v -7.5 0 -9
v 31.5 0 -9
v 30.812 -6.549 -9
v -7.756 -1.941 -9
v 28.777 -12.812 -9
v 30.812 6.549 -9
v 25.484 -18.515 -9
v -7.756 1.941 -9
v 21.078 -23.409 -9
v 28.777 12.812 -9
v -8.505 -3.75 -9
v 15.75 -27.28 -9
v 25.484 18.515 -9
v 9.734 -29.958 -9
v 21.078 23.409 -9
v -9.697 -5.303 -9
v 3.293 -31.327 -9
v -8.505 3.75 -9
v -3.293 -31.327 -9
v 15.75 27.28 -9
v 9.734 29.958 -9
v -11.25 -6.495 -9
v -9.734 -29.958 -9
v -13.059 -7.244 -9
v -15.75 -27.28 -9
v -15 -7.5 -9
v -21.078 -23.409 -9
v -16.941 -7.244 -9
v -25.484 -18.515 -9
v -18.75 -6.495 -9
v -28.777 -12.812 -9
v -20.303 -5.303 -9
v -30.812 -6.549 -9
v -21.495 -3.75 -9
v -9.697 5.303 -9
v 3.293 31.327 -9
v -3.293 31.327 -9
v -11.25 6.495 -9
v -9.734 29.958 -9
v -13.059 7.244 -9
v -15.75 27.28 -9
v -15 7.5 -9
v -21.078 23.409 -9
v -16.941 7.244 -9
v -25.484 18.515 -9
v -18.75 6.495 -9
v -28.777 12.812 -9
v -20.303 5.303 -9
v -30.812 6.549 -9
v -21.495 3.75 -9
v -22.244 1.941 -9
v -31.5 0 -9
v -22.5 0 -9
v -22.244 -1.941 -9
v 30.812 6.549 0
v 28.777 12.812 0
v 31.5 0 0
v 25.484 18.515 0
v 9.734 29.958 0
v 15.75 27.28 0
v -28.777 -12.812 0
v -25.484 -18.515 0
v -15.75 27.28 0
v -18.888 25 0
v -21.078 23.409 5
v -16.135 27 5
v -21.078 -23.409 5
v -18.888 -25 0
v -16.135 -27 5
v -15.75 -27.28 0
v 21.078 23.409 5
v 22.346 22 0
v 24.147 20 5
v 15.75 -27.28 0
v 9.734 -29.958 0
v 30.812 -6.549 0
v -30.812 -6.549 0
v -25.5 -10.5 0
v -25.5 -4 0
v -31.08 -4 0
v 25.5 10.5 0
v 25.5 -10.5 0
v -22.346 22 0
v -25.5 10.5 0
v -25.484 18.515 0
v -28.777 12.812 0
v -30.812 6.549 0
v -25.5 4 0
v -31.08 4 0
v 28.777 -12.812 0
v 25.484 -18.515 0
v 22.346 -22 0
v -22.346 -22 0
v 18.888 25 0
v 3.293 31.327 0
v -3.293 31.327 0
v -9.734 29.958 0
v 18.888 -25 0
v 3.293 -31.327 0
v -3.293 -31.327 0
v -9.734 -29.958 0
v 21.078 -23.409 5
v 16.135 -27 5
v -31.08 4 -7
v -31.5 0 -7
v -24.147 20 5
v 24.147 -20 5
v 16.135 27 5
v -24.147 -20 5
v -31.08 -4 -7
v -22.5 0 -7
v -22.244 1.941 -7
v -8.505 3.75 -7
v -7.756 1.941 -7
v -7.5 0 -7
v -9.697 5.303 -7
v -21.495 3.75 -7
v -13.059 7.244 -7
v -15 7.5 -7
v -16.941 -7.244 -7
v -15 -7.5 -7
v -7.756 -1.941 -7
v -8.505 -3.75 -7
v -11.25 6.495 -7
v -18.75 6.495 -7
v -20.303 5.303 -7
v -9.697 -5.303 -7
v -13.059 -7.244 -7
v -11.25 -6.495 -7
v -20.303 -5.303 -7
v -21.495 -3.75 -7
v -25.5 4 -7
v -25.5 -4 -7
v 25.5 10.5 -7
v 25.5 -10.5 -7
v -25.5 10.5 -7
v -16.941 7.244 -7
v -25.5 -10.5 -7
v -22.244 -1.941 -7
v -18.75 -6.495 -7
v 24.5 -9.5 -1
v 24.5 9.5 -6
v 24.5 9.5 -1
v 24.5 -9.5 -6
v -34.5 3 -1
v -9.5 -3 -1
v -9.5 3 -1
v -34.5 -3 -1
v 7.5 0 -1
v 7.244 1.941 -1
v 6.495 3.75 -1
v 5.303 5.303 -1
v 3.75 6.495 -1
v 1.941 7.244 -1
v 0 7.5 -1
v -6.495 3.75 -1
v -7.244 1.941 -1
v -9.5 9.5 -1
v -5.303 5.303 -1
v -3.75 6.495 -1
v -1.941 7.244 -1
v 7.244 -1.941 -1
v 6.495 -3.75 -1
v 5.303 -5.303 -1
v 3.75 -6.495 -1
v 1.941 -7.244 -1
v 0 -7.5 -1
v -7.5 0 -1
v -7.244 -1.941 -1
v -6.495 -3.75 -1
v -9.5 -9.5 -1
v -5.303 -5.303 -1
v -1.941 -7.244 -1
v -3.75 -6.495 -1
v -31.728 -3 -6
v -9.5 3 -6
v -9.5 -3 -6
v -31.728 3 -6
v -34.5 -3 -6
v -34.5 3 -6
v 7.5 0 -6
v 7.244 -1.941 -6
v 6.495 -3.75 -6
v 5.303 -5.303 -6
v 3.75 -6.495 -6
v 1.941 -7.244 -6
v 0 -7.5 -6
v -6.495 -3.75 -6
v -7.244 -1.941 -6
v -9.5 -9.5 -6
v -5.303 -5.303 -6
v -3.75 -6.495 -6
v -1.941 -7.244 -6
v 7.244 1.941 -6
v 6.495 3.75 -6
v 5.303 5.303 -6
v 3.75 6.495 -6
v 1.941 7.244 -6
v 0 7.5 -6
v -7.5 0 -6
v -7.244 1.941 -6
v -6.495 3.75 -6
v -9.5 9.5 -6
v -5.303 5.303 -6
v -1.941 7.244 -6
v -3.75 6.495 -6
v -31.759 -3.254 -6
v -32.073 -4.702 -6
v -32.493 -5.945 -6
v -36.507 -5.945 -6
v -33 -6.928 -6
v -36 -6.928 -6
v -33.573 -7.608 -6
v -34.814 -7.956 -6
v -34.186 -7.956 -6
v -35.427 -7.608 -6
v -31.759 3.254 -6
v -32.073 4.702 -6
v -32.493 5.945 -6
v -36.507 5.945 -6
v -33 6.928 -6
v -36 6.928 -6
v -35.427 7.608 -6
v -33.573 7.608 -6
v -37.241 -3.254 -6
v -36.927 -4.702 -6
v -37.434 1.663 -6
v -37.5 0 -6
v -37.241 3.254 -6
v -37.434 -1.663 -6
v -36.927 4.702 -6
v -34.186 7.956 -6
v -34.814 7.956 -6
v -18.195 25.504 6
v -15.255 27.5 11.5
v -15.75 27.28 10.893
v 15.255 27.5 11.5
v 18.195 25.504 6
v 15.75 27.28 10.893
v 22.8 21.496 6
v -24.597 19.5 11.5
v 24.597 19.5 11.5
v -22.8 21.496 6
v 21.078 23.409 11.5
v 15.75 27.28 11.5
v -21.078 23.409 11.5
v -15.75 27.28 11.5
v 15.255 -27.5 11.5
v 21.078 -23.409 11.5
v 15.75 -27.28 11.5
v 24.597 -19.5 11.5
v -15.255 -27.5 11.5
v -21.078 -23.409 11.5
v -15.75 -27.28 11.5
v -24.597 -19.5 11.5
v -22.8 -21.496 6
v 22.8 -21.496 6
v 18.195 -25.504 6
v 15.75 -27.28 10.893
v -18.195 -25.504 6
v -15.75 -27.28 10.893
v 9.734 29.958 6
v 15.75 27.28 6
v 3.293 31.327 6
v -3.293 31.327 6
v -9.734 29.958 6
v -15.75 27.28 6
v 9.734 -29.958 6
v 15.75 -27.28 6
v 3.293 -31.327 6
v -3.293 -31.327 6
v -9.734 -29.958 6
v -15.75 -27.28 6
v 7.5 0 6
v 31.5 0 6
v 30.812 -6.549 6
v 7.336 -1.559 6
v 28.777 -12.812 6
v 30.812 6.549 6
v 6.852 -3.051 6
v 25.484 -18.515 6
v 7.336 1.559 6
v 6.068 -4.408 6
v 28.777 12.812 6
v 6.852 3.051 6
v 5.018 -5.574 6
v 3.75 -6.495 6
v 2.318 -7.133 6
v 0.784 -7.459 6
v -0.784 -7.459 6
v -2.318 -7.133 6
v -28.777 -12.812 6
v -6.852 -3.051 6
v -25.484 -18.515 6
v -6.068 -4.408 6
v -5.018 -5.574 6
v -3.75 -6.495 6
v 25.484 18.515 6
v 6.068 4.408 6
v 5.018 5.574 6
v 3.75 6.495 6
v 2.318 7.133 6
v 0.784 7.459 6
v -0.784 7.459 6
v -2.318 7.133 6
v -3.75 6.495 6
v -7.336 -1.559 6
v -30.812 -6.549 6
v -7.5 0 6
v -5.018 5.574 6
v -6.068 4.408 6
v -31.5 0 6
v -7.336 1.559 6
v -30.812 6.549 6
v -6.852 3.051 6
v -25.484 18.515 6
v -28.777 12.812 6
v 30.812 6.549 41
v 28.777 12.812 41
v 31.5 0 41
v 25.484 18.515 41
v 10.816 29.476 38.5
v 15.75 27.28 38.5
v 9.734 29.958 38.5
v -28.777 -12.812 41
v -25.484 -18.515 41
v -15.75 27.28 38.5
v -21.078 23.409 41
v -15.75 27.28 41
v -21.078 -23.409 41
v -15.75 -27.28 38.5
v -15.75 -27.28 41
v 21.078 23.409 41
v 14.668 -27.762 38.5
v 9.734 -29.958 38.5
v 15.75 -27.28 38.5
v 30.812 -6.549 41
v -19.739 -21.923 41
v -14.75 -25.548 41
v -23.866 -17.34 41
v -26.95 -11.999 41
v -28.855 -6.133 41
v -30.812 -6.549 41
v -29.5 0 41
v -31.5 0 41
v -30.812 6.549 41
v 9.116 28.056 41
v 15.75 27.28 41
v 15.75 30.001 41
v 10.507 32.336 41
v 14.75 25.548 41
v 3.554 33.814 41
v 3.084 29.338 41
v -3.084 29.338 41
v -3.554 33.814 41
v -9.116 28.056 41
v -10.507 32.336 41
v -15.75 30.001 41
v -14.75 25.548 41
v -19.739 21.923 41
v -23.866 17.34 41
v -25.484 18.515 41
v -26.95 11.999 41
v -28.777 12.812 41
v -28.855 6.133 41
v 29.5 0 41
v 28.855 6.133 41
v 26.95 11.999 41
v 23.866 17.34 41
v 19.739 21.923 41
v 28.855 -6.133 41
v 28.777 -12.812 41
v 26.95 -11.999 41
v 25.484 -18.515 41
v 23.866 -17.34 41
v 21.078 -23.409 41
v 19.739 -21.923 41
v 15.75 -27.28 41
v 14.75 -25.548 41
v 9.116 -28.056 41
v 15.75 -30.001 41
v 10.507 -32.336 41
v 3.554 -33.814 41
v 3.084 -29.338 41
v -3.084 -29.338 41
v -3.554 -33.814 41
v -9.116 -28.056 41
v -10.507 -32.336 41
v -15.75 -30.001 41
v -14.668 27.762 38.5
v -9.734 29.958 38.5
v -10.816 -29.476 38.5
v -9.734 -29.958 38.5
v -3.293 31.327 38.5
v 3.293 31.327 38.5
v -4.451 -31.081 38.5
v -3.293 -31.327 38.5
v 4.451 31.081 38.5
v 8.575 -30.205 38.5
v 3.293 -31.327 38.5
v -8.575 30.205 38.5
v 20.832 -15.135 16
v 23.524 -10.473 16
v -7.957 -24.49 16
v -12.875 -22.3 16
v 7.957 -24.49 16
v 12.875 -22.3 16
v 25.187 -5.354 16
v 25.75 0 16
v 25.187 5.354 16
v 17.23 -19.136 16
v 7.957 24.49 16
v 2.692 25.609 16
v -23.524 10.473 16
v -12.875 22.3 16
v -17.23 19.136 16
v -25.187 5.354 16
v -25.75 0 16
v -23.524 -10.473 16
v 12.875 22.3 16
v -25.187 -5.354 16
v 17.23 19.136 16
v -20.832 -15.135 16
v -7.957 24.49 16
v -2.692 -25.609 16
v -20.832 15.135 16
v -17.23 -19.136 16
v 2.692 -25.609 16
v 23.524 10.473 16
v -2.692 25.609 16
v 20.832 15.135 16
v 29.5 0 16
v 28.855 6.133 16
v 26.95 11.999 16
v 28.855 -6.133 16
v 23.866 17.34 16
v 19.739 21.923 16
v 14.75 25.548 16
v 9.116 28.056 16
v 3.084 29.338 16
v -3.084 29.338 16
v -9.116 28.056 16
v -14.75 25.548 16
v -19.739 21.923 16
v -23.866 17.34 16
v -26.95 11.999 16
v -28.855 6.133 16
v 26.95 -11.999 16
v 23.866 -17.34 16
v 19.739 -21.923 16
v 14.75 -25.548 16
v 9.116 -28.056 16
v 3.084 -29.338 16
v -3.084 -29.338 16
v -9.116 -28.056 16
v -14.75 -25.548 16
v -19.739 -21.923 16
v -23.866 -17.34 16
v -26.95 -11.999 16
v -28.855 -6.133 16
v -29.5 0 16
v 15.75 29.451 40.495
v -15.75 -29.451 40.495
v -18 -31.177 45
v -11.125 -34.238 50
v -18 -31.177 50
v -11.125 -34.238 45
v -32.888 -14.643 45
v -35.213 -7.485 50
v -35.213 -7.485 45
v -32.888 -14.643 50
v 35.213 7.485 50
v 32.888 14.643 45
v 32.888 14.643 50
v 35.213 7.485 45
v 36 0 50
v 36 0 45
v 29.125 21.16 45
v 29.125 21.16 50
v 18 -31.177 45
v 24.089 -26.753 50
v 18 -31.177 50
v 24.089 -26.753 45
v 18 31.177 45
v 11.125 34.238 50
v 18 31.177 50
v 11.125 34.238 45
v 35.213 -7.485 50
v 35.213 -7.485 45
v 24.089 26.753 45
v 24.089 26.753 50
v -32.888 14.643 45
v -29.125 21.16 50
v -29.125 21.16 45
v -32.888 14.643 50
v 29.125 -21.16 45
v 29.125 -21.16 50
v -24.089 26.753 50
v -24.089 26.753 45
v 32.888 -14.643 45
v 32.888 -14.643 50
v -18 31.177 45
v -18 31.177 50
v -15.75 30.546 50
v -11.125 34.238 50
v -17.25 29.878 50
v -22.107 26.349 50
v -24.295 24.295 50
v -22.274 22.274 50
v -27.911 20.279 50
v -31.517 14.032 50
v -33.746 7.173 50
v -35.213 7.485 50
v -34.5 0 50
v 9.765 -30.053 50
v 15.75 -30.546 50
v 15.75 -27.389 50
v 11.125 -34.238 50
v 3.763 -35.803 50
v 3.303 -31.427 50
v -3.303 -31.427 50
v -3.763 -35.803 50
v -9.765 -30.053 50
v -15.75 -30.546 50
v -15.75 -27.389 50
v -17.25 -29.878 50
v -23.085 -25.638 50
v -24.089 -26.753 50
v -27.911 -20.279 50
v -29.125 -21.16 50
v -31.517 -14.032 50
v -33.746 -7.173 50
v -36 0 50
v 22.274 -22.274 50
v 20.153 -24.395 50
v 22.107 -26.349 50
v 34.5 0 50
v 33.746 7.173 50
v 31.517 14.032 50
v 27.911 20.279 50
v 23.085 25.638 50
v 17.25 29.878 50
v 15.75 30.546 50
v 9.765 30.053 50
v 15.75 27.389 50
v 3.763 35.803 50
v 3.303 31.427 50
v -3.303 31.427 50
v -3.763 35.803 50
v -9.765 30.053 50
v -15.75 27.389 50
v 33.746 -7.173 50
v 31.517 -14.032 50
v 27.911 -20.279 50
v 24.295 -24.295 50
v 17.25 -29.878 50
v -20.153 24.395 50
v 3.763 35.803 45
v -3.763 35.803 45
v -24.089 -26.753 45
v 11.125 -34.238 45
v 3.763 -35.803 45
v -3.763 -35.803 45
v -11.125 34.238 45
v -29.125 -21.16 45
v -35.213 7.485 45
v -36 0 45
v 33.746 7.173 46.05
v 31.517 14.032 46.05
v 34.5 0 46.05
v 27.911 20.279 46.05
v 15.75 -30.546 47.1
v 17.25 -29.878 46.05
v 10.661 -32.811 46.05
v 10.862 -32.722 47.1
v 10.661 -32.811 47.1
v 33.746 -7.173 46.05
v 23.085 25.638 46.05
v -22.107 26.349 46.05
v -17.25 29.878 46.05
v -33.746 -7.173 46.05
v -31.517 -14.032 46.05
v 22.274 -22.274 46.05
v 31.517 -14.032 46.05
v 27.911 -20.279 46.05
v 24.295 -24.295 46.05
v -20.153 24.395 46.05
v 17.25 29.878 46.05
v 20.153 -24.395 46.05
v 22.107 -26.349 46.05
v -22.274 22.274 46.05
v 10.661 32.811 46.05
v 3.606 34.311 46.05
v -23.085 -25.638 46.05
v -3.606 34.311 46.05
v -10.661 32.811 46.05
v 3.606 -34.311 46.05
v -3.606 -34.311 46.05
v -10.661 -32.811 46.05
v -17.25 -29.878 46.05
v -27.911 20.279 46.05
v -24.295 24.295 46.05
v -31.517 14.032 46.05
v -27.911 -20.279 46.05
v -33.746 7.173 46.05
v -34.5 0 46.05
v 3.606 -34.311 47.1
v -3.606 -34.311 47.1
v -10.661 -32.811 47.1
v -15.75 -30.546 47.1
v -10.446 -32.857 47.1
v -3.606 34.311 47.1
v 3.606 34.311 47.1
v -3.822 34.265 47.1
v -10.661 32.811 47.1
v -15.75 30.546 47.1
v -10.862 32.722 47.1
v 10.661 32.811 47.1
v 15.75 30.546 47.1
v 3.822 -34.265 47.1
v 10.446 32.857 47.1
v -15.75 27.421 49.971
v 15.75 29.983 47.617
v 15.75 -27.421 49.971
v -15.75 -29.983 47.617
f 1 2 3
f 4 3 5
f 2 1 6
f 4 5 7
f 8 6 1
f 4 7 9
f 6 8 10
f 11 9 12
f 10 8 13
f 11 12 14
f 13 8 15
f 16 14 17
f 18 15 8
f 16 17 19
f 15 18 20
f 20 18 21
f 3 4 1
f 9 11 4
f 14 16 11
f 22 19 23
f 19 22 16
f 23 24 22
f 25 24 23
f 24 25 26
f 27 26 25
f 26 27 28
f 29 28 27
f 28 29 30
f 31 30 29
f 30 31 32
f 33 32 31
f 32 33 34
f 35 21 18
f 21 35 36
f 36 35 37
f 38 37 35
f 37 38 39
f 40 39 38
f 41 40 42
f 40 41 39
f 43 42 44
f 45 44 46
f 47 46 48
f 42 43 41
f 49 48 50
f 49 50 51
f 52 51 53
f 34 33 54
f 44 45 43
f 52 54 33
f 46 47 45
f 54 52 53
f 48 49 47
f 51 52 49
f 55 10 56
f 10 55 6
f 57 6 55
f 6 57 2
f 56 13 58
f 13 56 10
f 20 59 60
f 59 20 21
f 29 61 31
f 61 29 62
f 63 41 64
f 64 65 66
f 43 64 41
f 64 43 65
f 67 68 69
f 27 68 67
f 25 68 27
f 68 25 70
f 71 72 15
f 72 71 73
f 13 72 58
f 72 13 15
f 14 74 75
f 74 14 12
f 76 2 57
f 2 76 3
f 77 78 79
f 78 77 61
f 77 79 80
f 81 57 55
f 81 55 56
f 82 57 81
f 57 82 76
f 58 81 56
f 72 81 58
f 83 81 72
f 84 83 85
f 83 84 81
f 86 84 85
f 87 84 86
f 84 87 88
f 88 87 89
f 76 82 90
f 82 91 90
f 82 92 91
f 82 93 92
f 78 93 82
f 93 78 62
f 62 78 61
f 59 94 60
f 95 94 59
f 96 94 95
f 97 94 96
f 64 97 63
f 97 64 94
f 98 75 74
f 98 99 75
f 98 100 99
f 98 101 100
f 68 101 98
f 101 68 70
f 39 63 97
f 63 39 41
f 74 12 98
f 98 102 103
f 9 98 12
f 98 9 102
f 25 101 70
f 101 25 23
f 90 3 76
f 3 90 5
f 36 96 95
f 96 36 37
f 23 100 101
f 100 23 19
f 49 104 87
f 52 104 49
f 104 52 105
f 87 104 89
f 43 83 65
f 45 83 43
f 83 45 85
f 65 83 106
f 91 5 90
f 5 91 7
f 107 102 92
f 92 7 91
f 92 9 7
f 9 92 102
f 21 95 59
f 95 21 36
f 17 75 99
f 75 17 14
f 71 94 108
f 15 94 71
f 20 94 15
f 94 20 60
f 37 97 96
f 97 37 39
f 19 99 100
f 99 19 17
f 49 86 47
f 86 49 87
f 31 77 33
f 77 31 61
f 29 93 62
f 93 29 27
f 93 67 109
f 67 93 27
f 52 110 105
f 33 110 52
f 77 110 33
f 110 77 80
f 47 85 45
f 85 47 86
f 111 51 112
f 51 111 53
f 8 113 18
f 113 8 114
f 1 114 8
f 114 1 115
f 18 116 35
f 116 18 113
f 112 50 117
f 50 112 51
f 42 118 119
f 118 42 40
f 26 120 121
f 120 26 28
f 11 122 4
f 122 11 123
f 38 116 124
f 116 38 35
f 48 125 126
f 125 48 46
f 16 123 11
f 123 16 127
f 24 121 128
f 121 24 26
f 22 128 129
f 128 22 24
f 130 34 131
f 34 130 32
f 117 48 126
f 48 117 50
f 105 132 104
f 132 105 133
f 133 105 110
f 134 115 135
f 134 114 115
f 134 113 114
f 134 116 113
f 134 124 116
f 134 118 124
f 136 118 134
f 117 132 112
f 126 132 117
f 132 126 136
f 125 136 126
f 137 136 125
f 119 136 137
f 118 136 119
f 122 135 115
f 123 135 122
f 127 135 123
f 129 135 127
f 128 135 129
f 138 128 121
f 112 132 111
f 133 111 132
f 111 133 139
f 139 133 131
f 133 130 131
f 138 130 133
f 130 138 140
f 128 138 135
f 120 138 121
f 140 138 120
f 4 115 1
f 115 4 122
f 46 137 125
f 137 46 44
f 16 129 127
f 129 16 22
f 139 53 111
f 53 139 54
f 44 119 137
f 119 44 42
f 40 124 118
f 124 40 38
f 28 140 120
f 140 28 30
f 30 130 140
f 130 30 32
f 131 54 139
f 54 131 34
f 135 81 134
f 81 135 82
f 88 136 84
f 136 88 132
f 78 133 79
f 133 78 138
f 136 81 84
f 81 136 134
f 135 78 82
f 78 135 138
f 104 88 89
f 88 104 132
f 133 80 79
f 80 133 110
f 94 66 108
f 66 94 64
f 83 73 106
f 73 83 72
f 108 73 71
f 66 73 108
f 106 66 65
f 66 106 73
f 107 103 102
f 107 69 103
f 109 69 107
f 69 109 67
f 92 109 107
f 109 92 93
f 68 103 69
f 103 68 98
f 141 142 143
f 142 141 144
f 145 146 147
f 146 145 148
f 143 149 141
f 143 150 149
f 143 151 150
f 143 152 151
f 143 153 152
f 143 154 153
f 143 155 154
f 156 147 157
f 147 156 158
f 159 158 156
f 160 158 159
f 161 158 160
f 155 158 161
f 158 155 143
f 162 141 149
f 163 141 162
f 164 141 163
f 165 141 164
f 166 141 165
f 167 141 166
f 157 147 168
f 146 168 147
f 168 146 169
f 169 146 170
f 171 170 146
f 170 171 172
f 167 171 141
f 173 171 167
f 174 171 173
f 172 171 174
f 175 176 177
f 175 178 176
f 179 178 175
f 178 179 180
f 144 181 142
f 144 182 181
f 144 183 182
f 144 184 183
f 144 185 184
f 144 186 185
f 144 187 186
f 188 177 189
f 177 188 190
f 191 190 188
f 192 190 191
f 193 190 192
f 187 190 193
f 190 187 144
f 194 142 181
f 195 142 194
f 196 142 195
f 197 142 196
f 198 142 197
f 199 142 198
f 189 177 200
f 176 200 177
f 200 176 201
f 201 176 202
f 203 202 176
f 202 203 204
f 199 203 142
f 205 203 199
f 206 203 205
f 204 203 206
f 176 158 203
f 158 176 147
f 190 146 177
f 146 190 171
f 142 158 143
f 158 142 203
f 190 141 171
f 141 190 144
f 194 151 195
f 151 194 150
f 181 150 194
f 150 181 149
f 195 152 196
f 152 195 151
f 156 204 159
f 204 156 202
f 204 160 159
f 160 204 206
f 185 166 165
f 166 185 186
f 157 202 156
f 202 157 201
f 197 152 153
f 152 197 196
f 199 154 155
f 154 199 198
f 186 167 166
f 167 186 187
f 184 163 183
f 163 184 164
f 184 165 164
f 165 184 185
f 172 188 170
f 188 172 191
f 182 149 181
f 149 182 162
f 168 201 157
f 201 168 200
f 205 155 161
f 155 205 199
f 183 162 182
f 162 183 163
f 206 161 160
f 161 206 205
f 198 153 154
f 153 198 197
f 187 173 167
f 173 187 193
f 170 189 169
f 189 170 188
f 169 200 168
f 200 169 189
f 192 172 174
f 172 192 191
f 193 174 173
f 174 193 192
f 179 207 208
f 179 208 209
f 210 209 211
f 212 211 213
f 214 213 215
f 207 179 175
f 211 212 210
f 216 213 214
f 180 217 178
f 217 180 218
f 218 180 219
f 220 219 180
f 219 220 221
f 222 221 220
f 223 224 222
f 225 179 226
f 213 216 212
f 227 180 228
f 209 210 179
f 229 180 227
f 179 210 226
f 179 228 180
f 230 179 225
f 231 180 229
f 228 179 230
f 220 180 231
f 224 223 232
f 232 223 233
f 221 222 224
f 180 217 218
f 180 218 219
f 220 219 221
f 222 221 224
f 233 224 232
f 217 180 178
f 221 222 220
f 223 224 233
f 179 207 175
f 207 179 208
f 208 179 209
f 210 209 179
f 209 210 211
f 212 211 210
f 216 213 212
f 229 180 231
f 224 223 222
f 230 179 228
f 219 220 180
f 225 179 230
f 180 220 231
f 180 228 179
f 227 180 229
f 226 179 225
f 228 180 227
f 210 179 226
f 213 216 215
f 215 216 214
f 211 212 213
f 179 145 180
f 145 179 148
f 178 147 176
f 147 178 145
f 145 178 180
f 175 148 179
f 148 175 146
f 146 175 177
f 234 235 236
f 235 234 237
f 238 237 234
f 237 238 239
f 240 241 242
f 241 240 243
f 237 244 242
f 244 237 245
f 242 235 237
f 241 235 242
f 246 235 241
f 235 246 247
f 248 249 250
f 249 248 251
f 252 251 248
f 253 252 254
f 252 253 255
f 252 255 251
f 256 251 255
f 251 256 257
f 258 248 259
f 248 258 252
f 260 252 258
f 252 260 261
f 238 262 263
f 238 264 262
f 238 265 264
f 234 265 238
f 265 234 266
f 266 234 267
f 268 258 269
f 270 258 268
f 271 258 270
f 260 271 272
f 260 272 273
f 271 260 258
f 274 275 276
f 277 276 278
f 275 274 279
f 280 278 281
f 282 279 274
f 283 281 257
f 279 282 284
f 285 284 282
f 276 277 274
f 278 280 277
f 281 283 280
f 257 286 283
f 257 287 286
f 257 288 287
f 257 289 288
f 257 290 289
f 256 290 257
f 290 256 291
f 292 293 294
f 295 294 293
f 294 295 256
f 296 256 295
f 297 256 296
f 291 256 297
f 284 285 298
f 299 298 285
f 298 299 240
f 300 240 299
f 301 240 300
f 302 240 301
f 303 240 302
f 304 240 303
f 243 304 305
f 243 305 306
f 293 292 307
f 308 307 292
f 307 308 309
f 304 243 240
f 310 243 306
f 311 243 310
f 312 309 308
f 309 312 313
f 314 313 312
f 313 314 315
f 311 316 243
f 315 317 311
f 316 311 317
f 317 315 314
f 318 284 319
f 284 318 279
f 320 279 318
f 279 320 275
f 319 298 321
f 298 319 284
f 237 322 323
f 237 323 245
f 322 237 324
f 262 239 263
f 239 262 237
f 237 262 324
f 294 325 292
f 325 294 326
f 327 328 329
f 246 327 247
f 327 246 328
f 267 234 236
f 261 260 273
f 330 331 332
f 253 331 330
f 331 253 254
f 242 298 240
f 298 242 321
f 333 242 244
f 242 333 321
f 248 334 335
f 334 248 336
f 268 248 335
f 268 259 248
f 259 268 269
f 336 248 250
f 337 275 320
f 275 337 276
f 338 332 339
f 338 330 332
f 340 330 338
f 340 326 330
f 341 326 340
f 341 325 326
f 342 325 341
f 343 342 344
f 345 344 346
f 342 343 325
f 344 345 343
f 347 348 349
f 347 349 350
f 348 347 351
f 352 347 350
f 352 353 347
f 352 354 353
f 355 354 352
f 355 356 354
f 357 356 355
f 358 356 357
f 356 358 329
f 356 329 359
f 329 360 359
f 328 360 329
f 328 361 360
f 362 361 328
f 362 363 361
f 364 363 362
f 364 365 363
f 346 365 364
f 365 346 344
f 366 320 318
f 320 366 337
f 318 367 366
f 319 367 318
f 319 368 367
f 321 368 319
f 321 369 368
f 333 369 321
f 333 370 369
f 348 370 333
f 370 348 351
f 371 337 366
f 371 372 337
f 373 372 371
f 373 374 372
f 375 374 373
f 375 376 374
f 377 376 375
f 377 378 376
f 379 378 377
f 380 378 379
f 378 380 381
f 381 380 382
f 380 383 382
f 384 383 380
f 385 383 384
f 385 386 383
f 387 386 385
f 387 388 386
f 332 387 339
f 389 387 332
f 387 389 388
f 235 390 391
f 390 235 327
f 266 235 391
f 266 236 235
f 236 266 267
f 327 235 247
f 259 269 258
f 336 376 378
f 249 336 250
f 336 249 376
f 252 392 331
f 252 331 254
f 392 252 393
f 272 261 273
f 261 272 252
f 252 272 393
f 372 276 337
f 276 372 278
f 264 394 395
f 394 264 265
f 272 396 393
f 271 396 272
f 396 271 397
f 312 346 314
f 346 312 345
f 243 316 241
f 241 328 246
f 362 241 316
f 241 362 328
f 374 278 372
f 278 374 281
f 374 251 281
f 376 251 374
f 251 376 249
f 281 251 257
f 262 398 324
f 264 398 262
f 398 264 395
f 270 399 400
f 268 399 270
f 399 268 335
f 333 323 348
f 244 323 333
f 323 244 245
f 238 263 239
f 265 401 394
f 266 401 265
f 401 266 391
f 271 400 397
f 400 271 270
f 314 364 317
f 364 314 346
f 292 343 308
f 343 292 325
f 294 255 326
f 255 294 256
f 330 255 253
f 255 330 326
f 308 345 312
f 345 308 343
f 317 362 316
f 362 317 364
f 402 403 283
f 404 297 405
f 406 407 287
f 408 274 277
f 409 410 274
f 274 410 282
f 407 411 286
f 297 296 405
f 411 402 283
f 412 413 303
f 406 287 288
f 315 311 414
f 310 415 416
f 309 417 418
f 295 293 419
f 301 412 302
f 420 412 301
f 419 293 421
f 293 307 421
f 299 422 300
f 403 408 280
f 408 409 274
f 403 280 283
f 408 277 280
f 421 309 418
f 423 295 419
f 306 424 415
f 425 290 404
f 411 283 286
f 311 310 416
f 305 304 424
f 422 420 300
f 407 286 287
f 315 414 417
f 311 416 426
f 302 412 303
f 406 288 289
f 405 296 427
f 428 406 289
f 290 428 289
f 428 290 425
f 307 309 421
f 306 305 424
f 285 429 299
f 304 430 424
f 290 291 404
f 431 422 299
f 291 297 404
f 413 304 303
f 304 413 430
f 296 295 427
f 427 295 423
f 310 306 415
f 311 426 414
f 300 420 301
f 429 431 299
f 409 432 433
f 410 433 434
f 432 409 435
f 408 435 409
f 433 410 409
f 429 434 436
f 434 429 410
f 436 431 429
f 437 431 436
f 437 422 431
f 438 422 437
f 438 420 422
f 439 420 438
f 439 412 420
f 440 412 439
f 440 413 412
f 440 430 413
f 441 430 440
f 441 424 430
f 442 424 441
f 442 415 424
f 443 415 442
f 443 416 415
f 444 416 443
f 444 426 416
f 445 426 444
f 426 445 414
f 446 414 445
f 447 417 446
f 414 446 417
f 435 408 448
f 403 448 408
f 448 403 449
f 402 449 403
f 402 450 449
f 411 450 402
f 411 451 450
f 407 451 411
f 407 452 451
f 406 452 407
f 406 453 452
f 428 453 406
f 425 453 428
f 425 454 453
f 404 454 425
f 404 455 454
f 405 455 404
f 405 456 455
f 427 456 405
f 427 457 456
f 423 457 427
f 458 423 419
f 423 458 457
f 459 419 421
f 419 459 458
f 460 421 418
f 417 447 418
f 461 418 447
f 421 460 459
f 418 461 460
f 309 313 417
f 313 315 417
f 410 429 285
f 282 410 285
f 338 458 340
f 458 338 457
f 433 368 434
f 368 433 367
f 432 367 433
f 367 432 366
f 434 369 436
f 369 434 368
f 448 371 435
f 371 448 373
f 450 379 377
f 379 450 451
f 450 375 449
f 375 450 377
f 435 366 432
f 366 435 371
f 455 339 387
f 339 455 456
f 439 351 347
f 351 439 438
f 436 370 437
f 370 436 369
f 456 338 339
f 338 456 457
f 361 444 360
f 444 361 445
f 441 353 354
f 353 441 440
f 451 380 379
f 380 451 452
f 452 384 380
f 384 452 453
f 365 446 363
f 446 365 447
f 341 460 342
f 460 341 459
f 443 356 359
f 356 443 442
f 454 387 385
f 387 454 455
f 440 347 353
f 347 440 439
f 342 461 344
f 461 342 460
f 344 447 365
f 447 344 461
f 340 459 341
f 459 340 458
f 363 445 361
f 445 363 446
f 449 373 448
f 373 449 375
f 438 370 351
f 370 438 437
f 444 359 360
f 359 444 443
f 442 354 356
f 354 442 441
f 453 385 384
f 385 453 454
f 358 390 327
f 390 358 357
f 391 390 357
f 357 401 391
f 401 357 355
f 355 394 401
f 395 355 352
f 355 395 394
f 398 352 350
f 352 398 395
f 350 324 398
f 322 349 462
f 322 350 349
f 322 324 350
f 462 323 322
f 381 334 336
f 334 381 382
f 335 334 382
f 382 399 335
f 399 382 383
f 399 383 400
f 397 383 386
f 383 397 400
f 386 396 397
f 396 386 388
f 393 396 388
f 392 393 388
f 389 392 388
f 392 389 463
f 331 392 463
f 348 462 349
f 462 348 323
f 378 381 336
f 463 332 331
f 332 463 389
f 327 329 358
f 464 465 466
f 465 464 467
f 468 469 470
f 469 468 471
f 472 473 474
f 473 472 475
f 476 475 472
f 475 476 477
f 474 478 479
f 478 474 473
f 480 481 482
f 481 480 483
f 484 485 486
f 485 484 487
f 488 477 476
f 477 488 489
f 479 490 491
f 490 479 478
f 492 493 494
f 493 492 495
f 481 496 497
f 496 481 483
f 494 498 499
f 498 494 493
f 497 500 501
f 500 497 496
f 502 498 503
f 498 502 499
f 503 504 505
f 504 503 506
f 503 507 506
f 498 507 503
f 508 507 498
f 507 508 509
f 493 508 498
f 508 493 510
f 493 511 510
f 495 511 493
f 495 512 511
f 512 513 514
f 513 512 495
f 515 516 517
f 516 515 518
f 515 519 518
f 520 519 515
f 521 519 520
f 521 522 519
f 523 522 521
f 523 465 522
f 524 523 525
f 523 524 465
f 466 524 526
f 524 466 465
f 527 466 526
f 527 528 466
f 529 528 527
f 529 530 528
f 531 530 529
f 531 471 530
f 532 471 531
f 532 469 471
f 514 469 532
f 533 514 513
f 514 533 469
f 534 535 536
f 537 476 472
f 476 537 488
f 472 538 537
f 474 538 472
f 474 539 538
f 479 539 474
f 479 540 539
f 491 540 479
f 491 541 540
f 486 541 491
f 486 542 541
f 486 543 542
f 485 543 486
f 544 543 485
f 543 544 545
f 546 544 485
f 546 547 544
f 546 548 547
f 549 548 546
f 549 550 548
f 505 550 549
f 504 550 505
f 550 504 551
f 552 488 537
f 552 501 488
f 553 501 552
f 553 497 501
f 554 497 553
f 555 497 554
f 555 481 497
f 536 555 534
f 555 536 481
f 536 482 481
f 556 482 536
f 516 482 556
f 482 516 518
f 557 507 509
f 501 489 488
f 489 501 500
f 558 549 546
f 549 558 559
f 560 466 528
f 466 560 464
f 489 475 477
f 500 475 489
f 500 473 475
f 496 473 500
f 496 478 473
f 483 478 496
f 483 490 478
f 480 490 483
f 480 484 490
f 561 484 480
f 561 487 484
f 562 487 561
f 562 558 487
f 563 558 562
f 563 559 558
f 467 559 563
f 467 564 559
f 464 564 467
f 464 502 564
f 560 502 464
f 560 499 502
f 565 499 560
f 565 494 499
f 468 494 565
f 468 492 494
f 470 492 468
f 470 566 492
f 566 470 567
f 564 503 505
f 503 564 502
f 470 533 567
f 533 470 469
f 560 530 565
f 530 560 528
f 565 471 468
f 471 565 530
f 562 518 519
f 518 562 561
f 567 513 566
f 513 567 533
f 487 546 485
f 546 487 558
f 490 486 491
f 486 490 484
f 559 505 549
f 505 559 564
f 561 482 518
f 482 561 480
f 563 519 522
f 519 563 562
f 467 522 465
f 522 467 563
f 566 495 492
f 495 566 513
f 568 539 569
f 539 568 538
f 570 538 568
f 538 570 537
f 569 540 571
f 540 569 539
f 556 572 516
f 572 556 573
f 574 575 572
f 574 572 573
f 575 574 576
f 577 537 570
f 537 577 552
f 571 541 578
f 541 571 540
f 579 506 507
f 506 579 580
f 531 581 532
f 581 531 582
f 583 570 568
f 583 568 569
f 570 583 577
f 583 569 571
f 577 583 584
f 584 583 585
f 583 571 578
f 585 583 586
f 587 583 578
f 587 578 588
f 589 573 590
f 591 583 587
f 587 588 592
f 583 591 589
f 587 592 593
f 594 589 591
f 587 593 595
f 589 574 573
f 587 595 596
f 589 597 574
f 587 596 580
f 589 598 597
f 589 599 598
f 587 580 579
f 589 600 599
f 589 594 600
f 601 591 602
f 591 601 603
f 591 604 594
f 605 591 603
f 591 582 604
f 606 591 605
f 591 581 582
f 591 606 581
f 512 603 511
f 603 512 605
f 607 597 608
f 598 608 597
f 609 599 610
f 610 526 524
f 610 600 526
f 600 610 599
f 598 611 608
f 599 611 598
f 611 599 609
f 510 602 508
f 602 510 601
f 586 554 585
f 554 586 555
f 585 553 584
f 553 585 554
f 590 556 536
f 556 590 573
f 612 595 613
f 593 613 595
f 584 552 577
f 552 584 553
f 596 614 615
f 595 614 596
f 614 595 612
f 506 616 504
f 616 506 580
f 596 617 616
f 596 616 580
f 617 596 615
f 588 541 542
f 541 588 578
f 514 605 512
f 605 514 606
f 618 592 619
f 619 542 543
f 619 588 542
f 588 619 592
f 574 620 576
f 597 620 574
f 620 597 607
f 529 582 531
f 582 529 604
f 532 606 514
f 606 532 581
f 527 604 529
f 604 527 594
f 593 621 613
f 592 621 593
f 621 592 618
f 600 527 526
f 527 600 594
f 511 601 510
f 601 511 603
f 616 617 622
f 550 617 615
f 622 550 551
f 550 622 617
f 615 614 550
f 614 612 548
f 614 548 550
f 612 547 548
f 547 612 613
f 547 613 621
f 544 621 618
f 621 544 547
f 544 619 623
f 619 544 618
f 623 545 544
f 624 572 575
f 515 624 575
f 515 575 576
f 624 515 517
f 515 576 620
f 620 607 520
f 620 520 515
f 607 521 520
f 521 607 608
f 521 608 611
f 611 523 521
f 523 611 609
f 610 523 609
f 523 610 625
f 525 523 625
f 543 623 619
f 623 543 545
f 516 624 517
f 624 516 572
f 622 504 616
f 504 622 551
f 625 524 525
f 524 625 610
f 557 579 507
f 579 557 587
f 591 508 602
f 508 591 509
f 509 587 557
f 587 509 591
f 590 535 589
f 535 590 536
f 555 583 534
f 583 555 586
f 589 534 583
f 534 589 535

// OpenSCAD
candyr = 7.5;  // radius of hole, many thigns relative to this
overlap = 0;
wall = 2;
tolerance=1;
outwall = 6;  // guess
hheight = 25;
cheight = 10;

candyh = 5;
inleth = candyh/2;
outleth = 2;


handlewy = 6;
handlewx = candyr*2+wall+outwall+tolerance*2;
buttonx = 3;
buttony = 8;
doveoffset = 22;


slidewx = candyr*4 - overlap + wall*2;
slotwx = candyr*6 - overlap*2 + wall*2 + tolerance*2;

slidewy = candyr*2 + wall*2;
slotwy = slidewy + tolerance*2;


outr = slotwx/2 + outwall;  // minimum width

echo ("Outside radius = ",outr, " volume = ",outr*outr*3.1415926*hheight/1000);

//utility stuff

module mirror2(axis) {
  child(0);
  mirror(axis) child(0);
}

module dovetail_bot(length, offset){
  mirror2([0,1,0])
    translate([0,offset,0])
    rotate([90,0,90])
      linear_extrude(height=length, center=true, convexity=10, twist=0)
        polygon(points=[[0,0], [3,0], [5,5], [-2,5]], paths=[[0,1,2,3]]);
}

module dovetail_top(length, offset){
  mirror2([0,1,0])
    translate([0,offset,0])
	rotate([90,0,90])
	  linear_extrude(height=length, center=true, convexity=10, twist=0)
	    polygon(points=[[-0.5,-0.01], [3.5,-0.01], [5.5,5.5], [-2.5,5.5]], paths=[[0,1,2,3]]);
}


// slide
module slide() {
  translate([0,0,-candyh-tolerance]){
    difference(){
      translate([-candyr-wall, -candyr-wall , 0])
	 cube(size= [ slidewx, slidewy, candyh ], center=false);
       cylinder(h = candyh, r=candyr , center = false);
    }
    // slide handle
    translate([-handlewx-candyr-wall, -handlewy/2 ,0]){
       cube(size=[handlewx,handlewy, candyh], center=false);
    // button
       translate([0,handlewy/2,0])
	scale([buttonx/10,buttony/10,0])
	 cylinder(h=candyh, r=10, center=false);
    }
  }
} 

module bottom() {
  difference(){
    translate([0,0,-outleth-tolerance*2-candyh])
      cylinder(h=outleth+candyh+tolerance*2, r=outr, center=false);
    translate([-candyr*2-overlap, 0, -outleth-tolerance*2-candyh])
       cylinder(h = outleth, r=candyr , center = false);
    // slot
    translate([-slotwx/2, -slotwy/2, -candyh-tolerance*2])
      cube(size=[slotwx,slotwy,candyh+tolerance*2], center=false);
    // handle slot
    translate([-slotwx/2-outwall, -handlewy/2-tolerance, -candyh-tolerance*2])
       cube(size=[outwall, handlewy+tolerance*2, candyh+tolerance*2], center=false);
  }
  intersection(){
    cylinder(h=6, r=outr,center=false);
    dovetail_bot(60,doveoffset);
  }
}

module top() {
  difference() {
      cylinder(h=hheight+cheight, r=outr, center=false);
      // cone width = height for 45 deg overhang req'd for skeinforge-0006
      //cylinder(h=cheight, r1=candyr, r2=candyr+cheight, center=false);
      cylinder(h=cheight, r1=candyr, r2=outr-wall-candyr/2, center=false);
      translate([0,0,cheight])
	cylinder(h=hheight, r=outr-wall);
      dovetail_top(60,doveoffset);
  }
  // "threads" for the top
  translate([0,0,cheight+hheight])
  intersection(){
    rotate_extrude(convexity = 10)
      translate([outr-0.5,0,0])
      polygon(points=[[0,0], [0,-3], [3,0]], paths=[[0,1,2]]);
    translate([0,0,-3])
      cube(center=true,size=[outr,outr*2+10,7]);
  }
}

// note: lid is upsidown so it builds right
module lid()
{
  difference() {
    cylinder(h=5, r=outr+4.5);
    translate([0,0,1.05])  // 3*0.35 layer thickness
      cylinder(h=5, r=outr+3);
  }
  translate([0,0,2]) intersection(){
    rotate_extrude(convexity=10)
      translate([outr+3.1,0])
      polygon(points=[[0,0],[0,3],[-3,3]], paths=[[0,1,2]]);
     translate([0,0,2])
      cube(center=true,size=[outr,outr*2+10,5]);
  }
  rotate([0,0,45])
    translate([0,outr,0])
      cube(center=false,size=[3,3,5]);
  rotate([0,0,225])
    translate([0,outr,0])
      cube(center=false,size=[3,3,5]);
}



// comment out these and uncomment one at a time to export individual ports
// translate lines are to separate the parts for viewing

bottom();

slide();

//color([0.0,0.5,0.9,0.3]) 
translate([0,0,6])
  top();

translate([0,0,cheight+hheight+10])
  lid();
